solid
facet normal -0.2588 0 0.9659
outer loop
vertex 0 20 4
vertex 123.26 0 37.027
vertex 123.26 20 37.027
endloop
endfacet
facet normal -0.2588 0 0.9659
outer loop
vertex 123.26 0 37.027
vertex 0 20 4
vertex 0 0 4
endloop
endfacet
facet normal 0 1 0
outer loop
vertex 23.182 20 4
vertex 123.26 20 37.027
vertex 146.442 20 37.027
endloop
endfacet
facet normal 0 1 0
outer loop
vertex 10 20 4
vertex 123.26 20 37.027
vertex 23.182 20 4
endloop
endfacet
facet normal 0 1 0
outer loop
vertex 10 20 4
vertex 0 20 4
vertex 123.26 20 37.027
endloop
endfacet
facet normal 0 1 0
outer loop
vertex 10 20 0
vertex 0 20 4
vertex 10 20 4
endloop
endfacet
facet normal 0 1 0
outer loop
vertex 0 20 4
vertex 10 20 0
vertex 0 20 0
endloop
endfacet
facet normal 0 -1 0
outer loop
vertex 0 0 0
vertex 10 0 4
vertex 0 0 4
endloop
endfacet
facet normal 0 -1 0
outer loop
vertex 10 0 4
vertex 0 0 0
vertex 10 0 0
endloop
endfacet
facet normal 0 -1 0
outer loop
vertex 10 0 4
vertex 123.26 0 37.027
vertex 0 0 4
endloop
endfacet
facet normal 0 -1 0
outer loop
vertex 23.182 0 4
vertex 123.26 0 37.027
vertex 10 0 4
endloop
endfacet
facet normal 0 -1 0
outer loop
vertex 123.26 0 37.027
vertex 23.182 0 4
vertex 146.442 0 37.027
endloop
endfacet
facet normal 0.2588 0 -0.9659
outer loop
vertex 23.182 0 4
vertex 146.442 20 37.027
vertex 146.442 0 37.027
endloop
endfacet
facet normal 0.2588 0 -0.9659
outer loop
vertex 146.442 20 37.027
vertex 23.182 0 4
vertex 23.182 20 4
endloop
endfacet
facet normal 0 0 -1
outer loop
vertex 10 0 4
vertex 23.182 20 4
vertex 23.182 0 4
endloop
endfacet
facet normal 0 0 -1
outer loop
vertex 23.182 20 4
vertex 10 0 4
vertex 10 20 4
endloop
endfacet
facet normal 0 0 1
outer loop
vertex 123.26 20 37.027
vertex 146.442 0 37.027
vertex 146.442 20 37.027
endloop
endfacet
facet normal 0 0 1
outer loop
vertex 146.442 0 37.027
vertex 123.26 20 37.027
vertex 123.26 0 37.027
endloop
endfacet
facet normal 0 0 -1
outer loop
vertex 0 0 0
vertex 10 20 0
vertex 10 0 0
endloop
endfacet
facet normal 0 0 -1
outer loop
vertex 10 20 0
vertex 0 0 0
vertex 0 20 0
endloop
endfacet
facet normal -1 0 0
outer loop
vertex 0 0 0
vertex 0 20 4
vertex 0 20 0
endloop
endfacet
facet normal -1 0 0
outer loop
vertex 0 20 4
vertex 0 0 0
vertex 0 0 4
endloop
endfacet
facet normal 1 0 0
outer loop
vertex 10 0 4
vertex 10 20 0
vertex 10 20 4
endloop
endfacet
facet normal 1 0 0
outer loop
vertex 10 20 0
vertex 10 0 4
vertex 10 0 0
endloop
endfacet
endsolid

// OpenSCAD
angle = 75;
thickness = 6;
width = 20;
length = 150;

rotate([0, 0, 90]) {
translate([0, 0, 4])
difference(){
translate([0, -thickness * cos(angle), -thickness * sin(angle)])
rotate([angle, 0, 0])
cube(size=[width, thickness, length], center=false);
translate([-1, -length, -thickness])
    cube(size=[width + 2, length + thickness, thickness], center=false);
translate([-1, -length, length * cos(angle) - thickness * sin(angle)])
    cube(size=[width + 2, length + thickness, thickness], center=false);
}
translate([0, -width/2, 0])
cube(size=[width, width/2, 4], center=false);
}
